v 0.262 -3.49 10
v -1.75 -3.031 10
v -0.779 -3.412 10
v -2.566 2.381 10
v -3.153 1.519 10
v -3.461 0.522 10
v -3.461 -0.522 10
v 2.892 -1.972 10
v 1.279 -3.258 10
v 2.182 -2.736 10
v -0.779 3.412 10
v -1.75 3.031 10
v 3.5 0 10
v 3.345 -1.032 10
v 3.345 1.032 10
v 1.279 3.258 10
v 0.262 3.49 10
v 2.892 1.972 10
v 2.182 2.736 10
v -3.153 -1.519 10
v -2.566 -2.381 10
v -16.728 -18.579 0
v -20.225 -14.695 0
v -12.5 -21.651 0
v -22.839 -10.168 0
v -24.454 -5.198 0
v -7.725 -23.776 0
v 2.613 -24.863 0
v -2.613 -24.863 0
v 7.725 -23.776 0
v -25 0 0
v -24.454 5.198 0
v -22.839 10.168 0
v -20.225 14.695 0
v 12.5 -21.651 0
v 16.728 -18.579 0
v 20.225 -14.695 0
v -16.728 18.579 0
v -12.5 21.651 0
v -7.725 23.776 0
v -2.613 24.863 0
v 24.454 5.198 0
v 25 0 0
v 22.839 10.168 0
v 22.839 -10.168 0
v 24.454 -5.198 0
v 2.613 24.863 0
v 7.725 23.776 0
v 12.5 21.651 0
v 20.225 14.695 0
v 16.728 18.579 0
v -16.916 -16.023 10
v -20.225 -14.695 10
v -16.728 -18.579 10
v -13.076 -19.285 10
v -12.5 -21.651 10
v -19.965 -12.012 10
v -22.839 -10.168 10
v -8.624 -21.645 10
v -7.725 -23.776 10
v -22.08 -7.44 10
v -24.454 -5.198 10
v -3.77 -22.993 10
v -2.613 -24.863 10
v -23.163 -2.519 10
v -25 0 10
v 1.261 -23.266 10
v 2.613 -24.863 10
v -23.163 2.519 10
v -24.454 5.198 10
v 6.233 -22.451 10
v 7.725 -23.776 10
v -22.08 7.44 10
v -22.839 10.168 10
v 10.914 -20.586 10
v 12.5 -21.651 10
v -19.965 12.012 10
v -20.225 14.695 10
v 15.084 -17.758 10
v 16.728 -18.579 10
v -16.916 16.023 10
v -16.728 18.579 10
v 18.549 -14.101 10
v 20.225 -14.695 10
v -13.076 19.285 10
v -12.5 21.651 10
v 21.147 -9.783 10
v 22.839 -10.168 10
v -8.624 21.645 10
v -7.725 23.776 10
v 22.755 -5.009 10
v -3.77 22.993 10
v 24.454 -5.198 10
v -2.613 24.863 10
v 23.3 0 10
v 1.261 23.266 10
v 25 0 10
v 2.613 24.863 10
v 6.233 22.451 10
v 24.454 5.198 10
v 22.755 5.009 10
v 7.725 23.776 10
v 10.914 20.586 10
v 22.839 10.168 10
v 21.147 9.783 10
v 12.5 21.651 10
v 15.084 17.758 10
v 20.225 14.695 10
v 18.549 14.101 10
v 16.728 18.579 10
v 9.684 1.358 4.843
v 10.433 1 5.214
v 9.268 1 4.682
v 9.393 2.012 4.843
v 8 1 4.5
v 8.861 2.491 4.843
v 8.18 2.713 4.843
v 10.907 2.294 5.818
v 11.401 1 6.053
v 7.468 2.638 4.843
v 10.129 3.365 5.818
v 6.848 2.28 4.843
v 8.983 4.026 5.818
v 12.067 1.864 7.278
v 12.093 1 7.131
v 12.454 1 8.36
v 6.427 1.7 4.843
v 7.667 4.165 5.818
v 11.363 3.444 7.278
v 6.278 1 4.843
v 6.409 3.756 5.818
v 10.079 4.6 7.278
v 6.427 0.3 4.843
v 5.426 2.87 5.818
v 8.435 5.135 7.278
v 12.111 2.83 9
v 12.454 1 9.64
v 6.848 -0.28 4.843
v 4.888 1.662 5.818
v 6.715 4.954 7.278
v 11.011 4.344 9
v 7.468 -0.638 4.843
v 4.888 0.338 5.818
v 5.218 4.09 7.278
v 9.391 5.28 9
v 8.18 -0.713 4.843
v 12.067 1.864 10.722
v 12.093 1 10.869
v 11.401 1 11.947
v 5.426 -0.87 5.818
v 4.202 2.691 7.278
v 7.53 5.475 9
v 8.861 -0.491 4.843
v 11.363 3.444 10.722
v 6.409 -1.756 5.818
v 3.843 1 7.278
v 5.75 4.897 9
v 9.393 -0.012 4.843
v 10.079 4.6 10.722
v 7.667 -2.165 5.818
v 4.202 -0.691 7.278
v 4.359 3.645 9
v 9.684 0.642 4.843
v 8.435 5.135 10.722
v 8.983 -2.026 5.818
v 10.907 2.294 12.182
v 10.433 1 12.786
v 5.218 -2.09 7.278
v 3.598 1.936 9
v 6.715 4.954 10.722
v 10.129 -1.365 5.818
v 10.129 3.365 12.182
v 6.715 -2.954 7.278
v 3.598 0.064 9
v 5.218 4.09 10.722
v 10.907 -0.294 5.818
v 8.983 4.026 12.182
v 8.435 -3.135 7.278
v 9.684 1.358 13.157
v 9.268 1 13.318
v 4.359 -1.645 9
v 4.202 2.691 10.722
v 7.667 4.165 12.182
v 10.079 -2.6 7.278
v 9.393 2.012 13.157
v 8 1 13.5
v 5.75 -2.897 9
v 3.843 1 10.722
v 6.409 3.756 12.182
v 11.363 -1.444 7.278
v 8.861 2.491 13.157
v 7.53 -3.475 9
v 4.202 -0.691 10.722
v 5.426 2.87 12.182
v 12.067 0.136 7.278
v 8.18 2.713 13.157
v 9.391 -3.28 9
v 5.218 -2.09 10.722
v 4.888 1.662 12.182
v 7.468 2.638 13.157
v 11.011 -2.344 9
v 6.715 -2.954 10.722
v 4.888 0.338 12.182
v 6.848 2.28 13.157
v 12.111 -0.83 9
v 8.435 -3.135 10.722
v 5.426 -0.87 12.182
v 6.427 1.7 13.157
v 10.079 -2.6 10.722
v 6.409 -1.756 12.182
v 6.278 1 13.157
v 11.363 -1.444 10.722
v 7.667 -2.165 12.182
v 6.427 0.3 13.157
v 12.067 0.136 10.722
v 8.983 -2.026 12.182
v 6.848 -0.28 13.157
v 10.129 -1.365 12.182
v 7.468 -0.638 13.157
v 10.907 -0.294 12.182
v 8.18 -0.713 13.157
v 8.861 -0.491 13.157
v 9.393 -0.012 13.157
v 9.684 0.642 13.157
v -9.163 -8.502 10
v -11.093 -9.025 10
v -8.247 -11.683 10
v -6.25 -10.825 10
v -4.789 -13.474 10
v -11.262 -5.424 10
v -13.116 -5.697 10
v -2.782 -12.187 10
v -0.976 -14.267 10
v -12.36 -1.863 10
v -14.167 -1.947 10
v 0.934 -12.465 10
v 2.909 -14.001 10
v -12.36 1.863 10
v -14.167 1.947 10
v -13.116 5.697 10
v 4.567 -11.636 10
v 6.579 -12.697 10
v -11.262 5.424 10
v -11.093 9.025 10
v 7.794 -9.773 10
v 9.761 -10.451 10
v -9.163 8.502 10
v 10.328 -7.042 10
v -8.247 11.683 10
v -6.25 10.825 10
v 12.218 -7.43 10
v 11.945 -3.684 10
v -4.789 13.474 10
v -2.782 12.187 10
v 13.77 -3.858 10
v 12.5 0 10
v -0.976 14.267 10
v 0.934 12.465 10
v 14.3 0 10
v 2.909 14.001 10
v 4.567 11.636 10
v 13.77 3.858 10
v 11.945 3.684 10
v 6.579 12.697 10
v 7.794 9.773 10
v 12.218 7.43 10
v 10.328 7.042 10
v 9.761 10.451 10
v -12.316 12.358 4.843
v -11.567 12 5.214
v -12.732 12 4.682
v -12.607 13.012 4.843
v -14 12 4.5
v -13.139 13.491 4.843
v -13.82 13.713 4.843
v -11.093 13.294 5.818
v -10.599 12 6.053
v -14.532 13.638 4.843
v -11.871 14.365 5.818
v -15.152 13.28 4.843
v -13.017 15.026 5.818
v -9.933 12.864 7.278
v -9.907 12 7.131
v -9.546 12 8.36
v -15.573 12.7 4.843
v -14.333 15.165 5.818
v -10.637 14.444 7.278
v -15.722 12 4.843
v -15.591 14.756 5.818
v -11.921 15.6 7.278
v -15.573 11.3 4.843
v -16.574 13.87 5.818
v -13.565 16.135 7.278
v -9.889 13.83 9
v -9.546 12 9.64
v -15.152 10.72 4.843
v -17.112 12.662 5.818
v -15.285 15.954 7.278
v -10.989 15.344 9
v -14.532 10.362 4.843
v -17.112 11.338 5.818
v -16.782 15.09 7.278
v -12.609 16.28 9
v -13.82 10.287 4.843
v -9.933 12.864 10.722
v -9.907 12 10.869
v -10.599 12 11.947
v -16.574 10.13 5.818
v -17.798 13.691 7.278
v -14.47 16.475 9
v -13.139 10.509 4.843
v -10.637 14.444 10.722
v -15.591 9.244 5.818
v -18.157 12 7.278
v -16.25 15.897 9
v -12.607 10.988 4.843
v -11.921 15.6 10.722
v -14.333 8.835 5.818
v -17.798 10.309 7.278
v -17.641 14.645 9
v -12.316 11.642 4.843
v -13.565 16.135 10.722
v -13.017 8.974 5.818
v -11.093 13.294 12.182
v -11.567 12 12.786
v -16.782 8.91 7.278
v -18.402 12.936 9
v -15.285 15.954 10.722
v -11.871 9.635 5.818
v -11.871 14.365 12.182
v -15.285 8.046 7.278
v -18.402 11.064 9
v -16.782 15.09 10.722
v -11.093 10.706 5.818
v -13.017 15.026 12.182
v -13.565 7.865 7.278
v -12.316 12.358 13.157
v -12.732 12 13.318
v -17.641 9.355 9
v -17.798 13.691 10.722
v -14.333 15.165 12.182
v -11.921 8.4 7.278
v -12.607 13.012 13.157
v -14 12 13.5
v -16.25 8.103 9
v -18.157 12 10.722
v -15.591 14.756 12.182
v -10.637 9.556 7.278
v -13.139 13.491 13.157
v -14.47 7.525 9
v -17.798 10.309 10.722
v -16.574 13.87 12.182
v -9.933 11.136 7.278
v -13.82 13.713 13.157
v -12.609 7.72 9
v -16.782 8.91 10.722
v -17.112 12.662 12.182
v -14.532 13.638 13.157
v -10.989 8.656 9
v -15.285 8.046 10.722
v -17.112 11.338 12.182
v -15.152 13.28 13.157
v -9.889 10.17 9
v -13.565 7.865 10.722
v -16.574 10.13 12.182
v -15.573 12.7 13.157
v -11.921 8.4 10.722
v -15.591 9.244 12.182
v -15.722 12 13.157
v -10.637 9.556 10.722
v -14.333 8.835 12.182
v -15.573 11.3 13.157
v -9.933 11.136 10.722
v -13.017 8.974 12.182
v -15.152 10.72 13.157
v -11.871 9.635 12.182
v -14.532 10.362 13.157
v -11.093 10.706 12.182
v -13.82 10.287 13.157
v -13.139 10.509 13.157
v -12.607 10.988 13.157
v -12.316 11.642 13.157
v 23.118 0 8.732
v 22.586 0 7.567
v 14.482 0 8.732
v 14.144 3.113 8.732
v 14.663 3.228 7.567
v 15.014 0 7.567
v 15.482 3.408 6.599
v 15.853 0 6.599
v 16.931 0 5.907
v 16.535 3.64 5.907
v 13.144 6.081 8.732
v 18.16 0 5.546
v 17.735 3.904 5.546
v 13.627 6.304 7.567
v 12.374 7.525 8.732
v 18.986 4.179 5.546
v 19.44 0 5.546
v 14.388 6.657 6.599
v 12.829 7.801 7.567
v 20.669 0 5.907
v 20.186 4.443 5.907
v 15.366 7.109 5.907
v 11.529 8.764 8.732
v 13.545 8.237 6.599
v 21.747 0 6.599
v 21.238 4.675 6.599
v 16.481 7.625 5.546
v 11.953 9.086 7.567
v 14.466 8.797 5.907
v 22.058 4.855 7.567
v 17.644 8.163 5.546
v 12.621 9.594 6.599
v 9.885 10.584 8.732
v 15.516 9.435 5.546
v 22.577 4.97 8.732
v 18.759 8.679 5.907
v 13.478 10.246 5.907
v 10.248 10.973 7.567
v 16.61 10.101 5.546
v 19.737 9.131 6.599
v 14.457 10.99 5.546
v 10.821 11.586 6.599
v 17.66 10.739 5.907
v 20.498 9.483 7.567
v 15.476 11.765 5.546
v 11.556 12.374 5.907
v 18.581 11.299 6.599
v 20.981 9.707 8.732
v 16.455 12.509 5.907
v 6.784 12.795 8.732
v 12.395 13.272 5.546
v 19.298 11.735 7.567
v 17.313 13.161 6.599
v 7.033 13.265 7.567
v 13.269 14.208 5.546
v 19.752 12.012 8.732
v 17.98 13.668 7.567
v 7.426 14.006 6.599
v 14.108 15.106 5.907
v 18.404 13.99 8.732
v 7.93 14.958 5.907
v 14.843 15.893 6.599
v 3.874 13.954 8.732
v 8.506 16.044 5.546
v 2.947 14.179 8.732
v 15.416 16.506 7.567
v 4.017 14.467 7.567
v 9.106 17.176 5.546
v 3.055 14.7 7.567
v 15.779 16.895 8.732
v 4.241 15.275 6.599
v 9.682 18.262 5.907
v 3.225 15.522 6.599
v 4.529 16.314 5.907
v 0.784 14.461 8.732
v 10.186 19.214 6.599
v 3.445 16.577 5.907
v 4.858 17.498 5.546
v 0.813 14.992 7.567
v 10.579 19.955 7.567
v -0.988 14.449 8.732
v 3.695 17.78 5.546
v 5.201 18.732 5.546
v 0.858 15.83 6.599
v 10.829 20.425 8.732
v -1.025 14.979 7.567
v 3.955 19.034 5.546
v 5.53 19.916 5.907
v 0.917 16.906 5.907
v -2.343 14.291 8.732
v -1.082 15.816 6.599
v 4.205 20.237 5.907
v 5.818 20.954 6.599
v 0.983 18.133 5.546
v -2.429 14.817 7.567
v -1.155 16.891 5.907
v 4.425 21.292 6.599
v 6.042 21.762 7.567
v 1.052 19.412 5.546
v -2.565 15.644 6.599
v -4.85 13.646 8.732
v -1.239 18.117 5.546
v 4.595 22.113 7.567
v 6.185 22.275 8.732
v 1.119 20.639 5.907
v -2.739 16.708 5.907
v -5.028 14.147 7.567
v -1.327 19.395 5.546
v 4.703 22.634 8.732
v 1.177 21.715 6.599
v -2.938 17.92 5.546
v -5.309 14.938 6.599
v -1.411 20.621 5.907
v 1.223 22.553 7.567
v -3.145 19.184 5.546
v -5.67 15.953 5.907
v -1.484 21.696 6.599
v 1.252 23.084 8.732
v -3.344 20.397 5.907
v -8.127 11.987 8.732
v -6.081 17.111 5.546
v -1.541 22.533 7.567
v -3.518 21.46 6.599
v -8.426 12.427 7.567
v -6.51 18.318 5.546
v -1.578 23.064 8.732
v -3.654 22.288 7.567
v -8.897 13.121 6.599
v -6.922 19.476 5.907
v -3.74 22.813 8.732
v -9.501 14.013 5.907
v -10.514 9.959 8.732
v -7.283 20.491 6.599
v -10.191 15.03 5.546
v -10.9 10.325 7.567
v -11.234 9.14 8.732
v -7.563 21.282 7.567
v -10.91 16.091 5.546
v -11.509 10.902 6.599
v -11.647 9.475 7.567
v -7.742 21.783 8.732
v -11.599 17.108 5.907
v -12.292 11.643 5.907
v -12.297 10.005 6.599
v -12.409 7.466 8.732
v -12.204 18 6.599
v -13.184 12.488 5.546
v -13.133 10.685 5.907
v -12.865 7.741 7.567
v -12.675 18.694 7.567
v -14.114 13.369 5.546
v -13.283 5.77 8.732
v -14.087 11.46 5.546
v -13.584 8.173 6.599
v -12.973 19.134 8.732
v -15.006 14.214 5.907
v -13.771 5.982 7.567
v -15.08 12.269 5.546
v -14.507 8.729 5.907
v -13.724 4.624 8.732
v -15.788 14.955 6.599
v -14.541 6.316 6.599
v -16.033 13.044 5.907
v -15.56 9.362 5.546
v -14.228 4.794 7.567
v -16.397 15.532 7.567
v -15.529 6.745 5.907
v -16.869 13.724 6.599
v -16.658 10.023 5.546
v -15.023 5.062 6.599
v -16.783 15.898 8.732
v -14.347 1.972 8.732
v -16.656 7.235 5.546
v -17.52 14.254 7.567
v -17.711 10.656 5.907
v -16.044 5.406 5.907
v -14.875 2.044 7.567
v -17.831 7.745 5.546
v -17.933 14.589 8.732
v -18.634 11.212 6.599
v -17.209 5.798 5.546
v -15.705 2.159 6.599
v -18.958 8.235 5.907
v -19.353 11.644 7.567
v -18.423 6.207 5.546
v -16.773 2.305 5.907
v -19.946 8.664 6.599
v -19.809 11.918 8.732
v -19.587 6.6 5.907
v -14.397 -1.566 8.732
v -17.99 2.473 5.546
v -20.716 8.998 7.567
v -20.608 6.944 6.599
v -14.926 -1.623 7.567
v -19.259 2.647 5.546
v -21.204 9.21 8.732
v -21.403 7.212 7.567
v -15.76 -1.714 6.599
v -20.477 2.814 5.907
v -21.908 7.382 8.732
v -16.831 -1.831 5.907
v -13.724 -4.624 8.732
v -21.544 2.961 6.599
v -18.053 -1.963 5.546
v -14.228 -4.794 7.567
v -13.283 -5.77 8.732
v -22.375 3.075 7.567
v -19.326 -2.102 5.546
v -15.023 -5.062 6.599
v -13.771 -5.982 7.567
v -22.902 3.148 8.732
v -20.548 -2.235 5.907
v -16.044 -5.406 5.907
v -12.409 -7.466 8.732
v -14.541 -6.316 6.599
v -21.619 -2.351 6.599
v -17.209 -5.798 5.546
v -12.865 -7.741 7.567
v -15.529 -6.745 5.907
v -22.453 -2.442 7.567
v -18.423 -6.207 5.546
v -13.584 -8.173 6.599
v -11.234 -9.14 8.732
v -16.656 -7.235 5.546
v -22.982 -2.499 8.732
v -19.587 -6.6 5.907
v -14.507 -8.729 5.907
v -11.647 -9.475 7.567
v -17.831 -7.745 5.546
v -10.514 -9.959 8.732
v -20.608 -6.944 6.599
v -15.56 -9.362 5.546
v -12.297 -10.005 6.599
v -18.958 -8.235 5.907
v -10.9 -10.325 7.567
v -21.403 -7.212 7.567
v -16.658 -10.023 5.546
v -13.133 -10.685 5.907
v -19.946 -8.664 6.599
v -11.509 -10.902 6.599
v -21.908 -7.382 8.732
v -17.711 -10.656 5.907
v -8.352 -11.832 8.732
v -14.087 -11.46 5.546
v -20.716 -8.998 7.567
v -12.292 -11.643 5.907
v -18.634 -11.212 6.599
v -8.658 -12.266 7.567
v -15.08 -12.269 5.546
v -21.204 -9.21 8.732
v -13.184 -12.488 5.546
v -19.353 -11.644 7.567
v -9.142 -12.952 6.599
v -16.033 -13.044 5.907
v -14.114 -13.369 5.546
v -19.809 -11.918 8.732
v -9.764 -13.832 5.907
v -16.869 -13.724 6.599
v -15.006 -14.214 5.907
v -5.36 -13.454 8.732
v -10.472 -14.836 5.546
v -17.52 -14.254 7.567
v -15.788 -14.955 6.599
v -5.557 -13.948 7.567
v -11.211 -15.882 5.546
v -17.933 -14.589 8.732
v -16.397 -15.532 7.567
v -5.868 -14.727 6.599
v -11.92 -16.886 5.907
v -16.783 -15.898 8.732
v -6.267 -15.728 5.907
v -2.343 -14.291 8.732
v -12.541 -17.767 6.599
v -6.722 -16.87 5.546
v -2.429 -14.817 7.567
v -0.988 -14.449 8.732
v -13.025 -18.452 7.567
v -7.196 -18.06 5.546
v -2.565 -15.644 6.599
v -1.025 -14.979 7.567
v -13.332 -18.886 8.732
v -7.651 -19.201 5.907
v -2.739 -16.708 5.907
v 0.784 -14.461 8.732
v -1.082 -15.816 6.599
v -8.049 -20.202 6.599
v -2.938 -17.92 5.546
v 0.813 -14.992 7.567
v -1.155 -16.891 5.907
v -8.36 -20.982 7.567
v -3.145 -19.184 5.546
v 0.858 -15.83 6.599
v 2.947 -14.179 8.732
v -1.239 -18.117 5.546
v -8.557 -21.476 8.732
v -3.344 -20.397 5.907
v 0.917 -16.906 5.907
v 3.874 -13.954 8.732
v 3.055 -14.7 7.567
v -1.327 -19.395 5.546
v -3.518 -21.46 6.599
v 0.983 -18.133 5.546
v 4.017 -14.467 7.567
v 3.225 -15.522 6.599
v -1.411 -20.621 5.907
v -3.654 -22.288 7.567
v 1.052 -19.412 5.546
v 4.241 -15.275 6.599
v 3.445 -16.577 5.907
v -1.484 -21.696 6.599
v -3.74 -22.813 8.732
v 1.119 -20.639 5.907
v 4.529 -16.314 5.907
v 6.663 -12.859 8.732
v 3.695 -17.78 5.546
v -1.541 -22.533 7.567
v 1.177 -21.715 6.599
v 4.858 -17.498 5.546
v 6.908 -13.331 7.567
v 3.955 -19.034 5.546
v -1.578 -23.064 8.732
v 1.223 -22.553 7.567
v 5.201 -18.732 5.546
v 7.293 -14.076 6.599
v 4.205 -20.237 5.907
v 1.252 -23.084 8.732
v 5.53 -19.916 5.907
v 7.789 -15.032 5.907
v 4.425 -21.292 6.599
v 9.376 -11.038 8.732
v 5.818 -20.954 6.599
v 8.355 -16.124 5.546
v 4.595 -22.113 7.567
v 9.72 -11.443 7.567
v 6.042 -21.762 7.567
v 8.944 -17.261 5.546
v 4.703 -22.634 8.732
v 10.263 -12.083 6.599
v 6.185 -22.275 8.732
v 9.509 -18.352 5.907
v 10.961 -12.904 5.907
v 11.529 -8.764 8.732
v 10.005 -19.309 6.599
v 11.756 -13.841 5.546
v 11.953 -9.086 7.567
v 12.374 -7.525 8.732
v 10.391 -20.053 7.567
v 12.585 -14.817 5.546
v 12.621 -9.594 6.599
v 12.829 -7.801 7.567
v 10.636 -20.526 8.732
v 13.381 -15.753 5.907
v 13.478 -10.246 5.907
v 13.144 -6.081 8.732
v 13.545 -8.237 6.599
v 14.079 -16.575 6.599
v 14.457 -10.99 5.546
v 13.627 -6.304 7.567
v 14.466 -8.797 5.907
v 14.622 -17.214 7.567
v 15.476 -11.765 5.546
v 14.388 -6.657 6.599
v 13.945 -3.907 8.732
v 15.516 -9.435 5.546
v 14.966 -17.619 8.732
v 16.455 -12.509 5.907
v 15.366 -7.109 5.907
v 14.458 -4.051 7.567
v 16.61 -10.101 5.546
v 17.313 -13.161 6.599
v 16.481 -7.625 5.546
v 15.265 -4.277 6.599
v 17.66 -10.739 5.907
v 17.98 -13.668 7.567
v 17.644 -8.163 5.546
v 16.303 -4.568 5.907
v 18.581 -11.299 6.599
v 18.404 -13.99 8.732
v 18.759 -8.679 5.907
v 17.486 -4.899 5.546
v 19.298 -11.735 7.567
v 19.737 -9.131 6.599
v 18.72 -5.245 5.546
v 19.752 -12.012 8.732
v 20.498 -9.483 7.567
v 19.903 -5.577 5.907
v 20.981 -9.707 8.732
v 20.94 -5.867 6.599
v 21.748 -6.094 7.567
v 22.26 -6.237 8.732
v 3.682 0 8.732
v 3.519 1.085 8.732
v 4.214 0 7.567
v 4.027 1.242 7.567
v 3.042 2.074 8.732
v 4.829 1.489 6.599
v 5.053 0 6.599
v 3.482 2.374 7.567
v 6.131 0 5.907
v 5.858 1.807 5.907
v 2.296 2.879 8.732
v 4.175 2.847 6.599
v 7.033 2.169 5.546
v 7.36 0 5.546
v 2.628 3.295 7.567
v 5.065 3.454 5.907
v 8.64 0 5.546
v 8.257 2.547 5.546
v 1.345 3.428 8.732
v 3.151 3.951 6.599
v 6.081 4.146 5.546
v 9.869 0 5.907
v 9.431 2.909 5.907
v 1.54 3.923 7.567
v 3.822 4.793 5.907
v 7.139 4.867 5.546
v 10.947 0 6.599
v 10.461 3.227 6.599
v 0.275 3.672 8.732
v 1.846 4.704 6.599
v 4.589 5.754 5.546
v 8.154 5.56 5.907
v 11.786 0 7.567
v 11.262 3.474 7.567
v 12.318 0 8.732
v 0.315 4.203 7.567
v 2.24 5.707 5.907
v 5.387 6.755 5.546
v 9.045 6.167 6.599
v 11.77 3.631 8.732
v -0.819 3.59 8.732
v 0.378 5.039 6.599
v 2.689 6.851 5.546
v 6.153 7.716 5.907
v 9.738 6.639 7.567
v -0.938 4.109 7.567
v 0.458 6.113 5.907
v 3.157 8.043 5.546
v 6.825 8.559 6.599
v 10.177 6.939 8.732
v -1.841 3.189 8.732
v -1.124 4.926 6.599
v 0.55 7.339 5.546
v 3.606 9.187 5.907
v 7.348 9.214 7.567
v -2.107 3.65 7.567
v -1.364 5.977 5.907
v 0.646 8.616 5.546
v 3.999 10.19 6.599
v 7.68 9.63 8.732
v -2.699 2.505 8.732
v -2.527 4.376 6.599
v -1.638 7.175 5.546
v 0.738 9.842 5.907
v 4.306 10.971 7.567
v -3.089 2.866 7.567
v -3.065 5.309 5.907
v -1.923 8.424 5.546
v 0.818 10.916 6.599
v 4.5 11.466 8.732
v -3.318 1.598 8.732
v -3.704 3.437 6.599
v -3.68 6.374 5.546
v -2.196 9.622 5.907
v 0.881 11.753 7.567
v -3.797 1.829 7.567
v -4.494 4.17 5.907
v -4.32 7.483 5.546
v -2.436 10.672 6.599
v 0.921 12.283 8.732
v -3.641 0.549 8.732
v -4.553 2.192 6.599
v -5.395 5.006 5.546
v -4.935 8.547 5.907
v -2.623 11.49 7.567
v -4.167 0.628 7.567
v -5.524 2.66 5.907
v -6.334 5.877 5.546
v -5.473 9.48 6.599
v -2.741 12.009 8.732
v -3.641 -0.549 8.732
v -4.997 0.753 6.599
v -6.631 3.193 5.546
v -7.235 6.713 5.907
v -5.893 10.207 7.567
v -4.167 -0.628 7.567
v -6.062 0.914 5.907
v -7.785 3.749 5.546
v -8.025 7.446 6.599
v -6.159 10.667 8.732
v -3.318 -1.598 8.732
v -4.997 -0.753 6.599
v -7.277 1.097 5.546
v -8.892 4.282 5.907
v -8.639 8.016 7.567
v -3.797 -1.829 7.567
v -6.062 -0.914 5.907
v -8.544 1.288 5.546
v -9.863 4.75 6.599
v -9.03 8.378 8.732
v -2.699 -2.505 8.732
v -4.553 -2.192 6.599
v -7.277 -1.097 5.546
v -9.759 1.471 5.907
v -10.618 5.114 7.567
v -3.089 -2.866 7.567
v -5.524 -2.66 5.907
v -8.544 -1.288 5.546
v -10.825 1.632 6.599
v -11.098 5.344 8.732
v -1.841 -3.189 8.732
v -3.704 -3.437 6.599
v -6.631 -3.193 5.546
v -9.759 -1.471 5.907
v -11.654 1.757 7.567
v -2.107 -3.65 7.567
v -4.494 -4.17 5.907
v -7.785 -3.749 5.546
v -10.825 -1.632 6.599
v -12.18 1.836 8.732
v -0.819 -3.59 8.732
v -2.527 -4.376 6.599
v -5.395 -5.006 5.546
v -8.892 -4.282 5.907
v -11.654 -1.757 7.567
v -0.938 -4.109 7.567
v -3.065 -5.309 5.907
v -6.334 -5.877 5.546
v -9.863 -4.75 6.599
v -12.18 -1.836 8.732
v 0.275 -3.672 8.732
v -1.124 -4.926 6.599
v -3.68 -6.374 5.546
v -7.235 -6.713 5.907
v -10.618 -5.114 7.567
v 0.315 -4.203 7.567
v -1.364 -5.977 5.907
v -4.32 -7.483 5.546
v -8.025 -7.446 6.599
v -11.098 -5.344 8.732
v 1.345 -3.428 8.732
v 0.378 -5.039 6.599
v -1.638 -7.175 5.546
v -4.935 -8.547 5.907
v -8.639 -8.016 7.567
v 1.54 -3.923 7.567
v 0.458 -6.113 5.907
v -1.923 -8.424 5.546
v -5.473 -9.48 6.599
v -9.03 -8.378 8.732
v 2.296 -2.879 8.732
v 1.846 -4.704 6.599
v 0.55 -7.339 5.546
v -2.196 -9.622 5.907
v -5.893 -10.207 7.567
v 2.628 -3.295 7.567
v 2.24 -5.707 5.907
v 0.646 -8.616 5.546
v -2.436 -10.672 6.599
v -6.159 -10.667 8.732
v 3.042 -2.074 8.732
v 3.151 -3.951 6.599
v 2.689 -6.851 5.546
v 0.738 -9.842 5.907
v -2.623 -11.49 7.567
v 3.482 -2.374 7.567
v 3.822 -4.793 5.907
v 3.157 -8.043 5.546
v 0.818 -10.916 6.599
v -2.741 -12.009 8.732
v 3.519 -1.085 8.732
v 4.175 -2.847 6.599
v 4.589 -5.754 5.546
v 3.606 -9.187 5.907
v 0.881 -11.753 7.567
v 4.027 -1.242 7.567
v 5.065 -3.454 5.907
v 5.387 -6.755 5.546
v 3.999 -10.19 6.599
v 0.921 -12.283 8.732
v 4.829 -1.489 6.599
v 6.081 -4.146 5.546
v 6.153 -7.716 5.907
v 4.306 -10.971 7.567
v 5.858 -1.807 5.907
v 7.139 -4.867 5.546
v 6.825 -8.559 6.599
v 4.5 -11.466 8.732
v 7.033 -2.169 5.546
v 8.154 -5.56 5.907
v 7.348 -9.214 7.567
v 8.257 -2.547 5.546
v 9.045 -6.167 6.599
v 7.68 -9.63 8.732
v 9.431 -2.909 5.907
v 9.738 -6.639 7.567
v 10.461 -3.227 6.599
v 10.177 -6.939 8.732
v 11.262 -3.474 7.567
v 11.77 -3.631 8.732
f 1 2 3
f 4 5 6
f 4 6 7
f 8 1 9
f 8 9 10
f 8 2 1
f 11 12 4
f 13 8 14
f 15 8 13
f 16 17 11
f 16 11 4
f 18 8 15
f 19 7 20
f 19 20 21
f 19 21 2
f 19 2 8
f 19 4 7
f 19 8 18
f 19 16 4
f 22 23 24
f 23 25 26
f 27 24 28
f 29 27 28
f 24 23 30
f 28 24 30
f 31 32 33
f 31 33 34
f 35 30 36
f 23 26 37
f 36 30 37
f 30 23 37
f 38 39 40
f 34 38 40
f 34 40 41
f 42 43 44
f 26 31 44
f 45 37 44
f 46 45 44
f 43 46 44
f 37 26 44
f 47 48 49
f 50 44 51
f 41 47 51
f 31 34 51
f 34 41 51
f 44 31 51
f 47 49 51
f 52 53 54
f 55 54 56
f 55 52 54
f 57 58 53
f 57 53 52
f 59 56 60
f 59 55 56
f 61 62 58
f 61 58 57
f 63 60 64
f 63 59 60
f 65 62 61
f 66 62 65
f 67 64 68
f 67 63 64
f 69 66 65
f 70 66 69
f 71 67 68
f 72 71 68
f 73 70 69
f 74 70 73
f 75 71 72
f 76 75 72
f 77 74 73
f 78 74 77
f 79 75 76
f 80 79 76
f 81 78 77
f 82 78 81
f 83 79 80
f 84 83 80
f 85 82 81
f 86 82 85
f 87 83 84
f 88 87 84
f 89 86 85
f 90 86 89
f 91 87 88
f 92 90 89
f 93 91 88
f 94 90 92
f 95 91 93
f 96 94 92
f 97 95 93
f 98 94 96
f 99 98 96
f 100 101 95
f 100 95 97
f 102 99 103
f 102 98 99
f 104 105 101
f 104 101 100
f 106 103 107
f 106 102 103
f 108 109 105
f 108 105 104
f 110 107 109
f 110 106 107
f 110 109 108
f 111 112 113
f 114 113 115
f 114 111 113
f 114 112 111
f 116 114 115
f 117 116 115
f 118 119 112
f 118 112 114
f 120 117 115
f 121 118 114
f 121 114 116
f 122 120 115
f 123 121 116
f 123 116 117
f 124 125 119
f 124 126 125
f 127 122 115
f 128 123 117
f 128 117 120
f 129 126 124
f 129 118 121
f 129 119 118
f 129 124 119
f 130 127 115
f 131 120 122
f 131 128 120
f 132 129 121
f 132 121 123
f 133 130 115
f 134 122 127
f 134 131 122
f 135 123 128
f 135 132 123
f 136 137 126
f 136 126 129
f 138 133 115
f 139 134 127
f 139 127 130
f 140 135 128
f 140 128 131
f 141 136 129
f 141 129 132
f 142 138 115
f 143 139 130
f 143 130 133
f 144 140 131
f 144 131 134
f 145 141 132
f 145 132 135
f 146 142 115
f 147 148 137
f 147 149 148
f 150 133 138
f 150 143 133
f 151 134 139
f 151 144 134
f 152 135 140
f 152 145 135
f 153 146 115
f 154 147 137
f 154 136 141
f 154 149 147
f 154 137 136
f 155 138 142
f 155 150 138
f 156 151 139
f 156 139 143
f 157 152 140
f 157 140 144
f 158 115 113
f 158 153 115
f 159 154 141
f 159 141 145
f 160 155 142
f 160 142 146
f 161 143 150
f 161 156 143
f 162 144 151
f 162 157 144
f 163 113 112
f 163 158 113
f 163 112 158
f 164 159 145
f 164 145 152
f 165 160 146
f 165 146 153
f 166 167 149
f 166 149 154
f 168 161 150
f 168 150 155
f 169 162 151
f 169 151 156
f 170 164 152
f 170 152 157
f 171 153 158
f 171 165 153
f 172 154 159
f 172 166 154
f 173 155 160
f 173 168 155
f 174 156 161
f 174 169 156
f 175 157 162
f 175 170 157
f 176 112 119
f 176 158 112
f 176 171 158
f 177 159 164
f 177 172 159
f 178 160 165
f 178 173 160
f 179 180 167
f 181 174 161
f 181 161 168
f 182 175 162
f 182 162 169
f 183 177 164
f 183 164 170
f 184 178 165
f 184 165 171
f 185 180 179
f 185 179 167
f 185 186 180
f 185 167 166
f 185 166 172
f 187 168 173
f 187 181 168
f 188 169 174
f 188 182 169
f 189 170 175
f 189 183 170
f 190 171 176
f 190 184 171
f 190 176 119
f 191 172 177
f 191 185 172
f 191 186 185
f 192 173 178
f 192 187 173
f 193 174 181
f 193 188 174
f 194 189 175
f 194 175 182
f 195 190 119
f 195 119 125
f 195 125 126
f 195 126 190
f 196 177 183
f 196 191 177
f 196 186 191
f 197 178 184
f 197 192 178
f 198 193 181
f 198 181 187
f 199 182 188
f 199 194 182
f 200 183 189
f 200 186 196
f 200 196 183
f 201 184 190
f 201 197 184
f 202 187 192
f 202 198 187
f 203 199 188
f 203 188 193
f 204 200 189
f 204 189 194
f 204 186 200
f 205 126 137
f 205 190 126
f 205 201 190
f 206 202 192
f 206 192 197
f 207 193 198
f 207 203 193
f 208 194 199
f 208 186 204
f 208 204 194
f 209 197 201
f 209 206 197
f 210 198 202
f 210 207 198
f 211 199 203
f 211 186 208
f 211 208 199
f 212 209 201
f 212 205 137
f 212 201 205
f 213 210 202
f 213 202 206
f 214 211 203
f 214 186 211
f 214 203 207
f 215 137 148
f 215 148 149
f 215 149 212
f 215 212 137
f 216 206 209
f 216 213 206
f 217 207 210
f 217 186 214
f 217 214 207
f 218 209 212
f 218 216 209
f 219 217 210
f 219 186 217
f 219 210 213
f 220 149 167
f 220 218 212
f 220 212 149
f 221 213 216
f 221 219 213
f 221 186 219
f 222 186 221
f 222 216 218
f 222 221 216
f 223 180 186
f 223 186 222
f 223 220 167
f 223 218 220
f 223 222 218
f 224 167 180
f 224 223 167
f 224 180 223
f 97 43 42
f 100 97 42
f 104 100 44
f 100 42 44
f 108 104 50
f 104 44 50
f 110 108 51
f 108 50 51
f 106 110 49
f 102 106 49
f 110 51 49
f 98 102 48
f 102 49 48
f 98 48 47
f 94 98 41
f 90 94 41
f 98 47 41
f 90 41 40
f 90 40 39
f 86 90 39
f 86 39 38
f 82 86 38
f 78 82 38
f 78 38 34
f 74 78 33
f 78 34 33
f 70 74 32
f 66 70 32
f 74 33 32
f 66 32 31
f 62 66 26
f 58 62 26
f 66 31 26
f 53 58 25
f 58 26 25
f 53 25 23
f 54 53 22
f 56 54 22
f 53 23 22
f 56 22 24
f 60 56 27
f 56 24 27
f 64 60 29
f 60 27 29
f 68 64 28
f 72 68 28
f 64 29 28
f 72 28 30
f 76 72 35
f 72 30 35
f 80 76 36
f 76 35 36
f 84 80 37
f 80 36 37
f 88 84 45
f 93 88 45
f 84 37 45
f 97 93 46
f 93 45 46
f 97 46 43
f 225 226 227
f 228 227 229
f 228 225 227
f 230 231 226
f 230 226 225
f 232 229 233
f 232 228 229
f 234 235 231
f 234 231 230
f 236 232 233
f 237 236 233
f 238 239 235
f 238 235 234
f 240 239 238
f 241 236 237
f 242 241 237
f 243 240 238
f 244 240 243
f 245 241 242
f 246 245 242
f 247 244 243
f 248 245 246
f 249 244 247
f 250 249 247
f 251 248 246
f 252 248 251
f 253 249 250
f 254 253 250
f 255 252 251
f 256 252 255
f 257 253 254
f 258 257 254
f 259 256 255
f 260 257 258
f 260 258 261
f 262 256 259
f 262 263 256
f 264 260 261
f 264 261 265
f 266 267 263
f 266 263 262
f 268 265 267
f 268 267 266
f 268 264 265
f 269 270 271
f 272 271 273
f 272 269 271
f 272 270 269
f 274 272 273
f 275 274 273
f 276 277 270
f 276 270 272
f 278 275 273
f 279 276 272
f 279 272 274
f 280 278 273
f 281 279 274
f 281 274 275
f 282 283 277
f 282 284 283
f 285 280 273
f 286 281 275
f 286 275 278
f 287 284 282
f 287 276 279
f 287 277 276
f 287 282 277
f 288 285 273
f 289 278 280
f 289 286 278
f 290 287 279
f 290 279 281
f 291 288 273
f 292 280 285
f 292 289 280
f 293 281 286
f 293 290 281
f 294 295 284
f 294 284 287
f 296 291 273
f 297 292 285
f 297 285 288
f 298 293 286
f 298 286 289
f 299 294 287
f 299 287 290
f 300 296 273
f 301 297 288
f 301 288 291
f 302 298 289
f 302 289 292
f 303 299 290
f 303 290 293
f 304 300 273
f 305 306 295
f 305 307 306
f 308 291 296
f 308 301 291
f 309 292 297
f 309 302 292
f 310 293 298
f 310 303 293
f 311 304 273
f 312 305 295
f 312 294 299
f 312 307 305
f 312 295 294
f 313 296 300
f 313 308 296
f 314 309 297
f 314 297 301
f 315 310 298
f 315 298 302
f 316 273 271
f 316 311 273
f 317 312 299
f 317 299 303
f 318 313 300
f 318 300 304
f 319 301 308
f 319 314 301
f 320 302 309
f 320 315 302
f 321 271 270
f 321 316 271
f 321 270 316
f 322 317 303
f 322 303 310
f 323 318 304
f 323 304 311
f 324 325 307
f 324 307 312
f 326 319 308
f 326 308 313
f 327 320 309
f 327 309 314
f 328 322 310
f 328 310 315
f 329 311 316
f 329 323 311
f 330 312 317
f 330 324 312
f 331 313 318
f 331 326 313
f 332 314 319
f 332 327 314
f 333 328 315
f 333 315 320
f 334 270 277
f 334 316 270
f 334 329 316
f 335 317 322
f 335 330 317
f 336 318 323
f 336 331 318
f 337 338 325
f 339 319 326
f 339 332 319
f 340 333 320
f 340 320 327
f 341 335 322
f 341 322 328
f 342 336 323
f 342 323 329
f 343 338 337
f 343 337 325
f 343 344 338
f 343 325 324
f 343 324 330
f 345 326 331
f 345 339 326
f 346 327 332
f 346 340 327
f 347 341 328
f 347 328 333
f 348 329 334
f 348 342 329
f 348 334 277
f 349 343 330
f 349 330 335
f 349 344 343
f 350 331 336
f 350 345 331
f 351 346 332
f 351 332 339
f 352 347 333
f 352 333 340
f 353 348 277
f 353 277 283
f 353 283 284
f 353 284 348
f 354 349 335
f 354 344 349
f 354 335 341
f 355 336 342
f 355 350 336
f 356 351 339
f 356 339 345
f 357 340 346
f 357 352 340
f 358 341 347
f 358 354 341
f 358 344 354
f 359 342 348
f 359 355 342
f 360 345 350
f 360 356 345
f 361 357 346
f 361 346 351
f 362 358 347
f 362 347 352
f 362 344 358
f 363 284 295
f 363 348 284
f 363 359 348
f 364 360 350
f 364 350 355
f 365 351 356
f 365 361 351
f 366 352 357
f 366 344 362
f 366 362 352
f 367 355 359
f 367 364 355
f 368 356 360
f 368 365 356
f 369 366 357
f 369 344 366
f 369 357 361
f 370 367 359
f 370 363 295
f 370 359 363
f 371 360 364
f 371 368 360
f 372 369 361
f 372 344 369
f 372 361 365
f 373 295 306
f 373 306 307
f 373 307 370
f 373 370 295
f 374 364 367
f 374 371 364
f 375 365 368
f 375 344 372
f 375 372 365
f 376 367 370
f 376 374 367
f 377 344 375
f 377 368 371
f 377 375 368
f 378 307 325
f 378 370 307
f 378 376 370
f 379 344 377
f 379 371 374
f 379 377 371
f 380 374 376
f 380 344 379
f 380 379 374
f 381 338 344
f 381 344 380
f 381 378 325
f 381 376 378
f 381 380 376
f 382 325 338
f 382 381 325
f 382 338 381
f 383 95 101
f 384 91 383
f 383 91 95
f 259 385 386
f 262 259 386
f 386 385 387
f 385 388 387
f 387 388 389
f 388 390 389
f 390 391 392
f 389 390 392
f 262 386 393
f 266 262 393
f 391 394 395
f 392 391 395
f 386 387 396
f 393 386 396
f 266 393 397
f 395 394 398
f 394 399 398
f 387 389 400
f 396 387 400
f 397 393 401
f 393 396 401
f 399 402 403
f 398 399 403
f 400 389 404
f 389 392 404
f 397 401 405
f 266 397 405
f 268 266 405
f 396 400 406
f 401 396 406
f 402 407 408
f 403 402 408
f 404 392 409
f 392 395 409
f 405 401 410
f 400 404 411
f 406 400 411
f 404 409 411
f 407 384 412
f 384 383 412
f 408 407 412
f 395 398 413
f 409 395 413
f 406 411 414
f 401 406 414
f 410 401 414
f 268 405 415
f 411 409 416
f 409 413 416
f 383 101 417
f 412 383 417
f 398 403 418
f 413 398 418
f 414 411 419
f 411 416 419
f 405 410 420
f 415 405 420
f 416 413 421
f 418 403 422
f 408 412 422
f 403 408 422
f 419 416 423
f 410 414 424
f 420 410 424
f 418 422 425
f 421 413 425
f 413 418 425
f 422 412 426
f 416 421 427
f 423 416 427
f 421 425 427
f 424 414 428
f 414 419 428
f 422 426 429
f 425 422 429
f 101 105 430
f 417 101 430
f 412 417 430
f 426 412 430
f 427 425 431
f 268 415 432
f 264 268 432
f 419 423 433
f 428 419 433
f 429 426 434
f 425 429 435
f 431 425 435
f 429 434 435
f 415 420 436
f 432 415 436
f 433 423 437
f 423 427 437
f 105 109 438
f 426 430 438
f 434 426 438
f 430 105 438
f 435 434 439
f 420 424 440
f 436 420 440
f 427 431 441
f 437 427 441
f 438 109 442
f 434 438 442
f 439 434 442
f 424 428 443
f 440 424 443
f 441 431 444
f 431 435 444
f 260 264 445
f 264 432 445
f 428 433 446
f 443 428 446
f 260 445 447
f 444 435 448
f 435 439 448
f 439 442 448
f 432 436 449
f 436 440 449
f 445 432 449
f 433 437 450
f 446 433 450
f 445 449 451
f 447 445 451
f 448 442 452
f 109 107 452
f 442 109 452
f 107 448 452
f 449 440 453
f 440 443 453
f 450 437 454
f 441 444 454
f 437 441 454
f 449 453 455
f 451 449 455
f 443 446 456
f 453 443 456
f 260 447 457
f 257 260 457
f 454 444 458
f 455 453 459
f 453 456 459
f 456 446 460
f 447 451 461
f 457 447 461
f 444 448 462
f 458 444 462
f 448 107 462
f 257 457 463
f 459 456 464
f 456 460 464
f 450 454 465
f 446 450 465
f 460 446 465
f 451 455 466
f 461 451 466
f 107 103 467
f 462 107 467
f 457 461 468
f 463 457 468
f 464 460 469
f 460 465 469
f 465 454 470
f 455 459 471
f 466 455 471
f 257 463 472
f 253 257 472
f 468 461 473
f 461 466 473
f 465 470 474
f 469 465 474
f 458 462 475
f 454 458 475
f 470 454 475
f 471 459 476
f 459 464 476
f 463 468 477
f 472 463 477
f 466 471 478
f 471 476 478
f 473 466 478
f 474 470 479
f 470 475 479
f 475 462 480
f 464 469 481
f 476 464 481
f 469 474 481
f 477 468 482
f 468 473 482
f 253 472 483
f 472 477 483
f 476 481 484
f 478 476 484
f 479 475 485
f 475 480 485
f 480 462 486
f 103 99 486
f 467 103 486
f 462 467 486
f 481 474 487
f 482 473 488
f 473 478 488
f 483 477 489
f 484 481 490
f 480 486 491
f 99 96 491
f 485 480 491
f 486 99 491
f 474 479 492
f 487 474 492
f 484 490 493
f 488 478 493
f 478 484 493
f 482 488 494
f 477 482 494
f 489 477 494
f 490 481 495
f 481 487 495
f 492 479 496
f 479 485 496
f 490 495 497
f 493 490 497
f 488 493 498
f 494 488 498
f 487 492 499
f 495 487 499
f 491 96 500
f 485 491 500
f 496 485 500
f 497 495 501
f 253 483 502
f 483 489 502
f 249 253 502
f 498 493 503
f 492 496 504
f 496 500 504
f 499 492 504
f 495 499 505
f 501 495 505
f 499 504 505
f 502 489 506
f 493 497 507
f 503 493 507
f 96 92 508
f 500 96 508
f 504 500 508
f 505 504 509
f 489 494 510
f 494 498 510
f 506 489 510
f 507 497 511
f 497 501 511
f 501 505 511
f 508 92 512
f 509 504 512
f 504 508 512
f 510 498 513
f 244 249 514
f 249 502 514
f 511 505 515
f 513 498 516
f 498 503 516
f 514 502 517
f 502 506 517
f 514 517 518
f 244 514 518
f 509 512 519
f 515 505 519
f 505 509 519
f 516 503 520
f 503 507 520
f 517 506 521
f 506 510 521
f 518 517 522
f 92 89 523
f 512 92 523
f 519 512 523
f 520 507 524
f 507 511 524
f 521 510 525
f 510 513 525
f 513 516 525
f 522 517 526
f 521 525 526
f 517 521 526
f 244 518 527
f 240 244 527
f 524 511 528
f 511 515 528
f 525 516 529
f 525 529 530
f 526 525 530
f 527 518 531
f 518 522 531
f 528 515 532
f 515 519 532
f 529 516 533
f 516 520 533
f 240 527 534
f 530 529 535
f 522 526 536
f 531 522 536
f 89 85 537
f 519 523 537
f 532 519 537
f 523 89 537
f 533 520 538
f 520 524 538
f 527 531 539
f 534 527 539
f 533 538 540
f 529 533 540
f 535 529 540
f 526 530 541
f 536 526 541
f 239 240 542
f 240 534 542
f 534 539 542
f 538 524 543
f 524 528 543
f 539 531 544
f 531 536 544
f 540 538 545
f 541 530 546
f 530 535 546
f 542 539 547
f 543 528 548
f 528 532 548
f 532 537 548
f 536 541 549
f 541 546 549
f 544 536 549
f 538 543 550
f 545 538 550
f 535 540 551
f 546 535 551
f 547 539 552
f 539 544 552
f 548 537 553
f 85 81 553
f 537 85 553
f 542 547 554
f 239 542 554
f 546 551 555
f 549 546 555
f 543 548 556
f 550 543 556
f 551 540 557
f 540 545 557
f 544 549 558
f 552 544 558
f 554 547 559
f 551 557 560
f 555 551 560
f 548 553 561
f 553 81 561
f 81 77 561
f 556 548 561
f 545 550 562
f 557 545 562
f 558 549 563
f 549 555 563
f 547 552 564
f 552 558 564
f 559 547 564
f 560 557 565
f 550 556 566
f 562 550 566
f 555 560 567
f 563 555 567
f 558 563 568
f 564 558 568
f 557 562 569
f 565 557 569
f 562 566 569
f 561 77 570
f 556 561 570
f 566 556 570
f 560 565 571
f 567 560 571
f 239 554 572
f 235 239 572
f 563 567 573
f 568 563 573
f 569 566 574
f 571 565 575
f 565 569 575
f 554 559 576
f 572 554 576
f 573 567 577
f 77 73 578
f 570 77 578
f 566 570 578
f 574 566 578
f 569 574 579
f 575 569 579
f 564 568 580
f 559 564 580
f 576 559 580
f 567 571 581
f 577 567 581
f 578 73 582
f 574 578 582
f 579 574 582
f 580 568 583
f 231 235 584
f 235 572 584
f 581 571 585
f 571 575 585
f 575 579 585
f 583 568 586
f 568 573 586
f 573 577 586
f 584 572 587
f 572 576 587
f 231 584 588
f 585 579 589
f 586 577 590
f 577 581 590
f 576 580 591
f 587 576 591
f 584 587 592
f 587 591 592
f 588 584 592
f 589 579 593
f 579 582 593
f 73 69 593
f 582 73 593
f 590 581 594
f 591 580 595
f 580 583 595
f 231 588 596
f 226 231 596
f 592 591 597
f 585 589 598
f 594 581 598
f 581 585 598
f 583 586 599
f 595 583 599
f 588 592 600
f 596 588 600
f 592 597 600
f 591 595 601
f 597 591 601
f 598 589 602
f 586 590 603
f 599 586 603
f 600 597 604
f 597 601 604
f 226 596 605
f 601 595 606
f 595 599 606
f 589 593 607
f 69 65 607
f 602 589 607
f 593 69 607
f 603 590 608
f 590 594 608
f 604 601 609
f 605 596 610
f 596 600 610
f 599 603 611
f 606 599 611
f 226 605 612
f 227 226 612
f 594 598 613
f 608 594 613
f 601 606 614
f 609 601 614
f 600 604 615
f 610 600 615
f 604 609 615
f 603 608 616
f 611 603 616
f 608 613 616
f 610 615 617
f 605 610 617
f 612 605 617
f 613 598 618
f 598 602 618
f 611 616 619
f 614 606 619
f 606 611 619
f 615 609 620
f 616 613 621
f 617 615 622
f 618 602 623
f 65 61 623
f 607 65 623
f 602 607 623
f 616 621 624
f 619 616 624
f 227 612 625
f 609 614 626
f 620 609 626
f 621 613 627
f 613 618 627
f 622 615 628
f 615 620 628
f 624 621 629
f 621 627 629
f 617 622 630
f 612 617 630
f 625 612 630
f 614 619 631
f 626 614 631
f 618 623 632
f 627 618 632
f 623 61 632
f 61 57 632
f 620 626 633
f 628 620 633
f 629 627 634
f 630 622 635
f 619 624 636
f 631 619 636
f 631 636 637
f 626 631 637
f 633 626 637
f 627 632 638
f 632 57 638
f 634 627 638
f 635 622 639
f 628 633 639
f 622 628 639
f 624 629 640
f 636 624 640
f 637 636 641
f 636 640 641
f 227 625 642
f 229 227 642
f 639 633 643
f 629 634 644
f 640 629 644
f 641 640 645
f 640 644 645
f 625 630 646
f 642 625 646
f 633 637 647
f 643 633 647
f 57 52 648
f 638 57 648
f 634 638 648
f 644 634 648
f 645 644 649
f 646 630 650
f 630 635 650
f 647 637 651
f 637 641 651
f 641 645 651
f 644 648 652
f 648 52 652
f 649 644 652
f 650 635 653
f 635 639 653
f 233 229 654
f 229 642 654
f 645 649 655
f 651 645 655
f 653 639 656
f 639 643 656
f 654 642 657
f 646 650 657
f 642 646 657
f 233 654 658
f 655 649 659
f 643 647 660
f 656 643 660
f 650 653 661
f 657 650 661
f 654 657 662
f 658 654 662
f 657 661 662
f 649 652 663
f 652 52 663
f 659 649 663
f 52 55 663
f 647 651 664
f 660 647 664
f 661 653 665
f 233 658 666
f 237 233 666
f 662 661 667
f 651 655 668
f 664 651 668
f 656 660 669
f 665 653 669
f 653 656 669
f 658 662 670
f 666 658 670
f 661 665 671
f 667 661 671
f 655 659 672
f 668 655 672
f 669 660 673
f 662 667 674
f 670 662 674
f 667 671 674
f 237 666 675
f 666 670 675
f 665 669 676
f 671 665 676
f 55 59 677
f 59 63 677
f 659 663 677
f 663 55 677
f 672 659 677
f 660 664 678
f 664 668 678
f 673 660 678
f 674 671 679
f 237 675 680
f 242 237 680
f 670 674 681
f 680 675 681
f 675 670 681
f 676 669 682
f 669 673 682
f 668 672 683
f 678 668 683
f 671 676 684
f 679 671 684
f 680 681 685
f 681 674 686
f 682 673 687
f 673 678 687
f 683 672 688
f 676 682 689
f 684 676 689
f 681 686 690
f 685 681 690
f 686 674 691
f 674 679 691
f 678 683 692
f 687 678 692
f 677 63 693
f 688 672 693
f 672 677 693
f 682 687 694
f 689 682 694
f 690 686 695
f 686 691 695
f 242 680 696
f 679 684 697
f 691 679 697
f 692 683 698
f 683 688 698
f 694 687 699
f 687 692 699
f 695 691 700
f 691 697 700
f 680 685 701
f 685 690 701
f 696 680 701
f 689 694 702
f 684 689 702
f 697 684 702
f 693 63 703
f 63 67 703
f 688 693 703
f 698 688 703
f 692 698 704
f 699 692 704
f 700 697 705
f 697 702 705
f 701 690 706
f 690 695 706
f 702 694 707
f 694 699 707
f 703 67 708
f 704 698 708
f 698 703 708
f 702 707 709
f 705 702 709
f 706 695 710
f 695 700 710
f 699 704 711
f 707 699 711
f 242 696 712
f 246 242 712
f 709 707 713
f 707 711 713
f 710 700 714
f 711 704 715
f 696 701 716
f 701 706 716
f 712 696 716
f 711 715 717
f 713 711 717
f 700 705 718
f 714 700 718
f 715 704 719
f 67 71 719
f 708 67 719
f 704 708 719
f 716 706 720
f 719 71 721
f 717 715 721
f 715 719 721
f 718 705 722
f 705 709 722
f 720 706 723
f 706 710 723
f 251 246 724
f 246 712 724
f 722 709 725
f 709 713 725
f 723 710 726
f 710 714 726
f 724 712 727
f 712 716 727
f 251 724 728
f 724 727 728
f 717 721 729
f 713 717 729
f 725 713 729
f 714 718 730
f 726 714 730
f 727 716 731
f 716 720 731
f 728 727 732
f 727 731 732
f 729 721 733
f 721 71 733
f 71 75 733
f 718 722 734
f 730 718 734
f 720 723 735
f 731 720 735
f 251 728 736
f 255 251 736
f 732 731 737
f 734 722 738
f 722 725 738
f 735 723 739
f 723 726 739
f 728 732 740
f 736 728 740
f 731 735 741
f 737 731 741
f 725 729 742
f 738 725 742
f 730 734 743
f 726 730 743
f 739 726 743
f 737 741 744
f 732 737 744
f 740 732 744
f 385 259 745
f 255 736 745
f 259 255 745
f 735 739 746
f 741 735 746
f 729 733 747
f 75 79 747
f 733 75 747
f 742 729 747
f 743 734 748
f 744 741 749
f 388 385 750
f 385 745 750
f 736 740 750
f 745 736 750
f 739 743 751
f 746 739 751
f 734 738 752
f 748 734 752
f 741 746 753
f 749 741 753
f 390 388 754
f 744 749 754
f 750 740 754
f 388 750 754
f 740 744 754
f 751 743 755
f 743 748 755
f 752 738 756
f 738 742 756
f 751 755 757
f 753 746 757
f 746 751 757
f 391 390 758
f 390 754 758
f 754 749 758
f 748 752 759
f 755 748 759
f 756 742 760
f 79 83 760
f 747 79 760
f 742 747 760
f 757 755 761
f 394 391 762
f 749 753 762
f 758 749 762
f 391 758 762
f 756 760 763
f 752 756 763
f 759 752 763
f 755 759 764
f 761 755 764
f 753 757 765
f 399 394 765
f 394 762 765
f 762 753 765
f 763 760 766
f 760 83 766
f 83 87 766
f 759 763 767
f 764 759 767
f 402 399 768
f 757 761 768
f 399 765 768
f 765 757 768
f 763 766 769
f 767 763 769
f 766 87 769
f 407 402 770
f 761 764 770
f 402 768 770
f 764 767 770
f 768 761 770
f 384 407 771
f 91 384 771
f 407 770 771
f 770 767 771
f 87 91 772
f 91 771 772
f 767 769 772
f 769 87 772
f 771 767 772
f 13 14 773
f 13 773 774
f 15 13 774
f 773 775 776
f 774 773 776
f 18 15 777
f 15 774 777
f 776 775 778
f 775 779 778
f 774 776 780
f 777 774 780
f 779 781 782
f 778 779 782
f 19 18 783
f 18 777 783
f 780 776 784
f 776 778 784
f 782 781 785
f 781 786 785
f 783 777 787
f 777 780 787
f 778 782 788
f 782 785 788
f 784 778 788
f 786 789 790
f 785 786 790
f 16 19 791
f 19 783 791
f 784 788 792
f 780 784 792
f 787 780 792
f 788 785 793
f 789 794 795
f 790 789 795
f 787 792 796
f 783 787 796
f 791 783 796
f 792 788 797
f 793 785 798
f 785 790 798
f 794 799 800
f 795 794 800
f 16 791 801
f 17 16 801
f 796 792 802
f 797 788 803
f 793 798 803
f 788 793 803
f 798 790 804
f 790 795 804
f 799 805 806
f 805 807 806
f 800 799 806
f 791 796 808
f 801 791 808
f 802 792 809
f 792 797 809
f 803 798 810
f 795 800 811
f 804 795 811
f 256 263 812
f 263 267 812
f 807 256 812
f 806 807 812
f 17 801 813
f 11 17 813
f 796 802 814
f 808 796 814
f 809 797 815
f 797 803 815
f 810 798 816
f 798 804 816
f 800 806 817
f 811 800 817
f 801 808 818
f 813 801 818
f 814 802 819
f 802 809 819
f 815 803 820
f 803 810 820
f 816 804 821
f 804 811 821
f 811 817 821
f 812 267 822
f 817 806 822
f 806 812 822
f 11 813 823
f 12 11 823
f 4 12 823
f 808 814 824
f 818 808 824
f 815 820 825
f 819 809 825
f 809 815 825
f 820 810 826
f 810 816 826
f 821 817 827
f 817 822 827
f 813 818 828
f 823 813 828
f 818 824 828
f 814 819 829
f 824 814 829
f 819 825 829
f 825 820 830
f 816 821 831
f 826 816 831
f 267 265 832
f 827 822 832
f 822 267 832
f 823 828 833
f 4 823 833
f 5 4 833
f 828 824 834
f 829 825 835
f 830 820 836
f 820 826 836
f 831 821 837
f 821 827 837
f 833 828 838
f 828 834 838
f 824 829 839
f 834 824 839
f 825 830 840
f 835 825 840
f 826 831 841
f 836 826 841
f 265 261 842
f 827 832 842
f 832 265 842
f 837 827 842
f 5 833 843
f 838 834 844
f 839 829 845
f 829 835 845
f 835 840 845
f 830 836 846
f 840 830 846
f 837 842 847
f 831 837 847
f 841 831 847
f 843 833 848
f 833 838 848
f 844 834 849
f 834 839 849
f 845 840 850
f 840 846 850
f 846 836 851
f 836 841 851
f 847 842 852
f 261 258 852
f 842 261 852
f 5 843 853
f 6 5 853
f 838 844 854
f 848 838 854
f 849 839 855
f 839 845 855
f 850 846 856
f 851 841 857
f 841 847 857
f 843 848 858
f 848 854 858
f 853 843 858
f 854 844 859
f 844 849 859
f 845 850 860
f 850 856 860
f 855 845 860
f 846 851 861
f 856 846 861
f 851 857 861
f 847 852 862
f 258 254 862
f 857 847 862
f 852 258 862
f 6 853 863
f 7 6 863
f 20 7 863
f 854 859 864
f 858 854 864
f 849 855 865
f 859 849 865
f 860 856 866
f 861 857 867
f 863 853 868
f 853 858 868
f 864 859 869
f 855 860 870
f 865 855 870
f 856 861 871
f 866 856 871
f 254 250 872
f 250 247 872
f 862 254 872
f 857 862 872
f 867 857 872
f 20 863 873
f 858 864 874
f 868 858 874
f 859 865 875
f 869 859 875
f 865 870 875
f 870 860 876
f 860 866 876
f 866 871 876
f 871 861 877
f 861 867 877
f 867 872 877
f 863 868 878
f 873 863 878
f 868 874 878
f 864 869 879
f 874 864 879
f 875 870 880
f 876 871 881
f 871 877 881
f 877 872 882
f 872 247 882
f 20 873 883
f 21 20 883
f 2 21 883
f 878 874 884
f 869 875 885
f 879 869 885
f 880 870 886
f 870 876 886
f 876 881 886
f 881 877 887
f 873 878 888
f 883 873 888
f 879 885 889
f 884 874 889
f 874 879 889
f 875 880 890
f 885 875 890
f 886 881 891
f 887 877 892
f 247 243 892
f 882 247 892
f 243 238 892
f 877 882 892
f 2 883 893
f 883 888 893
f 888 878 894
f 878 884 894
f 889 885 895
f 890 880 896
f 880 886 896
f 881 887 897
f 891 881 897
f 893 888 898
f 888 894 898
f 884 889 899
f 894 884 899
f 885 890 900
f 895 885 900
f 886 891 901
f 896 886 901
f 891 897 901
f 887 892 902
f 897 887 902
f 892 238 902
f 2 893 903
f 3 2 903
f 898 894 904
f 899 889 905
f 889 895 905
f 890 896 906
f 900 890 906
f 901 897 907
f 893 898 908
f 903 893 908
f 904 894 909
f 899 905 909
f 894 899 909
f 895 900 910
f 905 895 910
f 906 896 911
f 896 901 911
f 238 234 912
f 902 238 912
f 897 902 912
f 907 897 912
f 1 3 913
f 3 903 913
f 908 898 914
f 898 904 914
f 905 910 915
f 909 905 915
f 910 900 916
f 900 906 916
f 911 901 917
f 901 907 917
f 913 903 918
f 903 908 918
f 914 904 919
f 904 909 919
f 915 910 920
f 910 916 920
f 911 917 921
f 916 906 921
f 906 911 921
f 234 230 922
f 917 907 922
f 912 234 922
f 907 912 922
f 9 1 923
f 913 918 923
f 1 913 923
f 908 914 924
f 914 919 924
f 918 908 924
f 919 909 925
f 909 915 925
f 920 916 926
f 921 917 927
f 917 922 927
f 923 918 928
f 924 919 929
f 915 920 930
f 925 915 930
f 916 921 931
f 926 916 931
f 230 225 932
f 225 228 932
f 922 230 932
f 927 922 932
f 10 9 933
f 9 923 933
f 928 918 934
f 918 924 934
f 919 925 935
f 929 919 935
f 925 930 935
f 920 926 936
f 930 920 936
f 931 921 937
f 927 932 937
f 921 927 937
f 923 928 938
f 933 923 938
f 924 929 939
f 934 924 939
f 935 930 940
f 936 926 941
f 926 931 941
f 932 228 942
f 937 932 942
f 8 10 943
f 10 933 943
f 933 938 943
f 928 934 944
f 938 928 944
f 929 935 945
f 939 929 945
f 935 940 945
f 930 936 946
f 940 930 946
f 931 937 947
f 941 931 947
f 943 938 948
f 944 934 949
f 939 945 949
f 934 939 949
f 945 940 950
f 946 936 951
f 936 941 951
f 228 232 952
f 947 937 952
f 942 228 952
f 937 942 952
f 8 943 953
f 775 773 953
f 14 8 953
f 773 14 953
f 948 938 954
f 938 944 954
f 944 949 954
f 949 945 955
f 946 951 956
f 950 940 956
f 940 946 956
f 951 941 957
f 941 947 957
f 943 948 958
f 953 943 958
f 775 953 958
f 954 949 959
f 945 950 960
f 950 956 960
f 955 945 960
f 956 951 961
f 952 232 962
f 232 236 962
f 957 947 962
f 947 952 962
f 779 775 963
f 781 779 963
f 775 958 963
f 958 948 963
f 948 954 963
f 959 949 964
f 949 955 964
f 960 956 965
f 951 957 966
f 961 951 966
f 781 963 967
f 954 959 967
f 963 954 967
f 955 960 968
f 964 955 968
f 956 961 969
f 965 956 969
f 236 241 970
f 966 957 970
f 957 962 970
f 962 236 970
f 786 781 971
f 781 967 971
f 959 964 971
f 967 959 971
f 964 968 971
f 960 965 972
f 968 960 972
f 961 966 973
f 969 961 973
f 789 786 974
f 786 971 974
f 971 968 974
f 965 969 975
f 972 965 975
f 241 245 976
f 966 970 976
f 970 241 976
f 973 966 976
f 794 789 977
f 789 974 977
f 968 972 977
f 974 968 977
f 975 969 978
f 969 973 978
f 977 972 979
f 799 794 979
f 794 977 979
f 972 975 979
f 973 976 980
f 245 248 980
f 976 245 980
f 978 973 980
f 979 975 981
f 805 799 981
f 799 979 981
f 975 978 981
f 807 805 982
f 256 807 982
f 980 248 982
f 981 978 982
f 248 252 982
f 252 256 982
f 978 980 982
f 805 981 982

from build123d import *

# Parameters (mm, degrees)
TORUS001_R     = 4.5
TORUS_R        = 4.5
CYLINDER_R     = 25
CYLINDER_DEPTH = 10


with BuildPart() as torus001:
    # Torus001 → Torus001 (revolve)
    with BuildSketch(Plane(origin=(0, 0, 10), x_dir=(1, 0, 0), z_dir=(0, -1, 0))):
        with Locations((18.8, 0)):
            Circle(TORUS001_R)
    revolve(axis=Axis((0, 0, 10), (0, 0, 1)))


with BuildPart() as torus:
    # Torus → Torus (revolve)
    with BuildSketch(Plane(origin=(0, 0, 10), x_dir=(1, 0, 0), z_dir=(0, -1, 0))):
        with Locations((8, 0)):
            Circle(TORUS_R)
    revolve(axis=Axis((0, 0, 10), (0, 0, 1)))


with BuildPart() as guarda_caniques:
    # Cylinder → Cylinder (new body)
    with BuildSketch(Plane.XY):
        Circle(CYLINDER_R)
    extrude(amount=CYLINDER_DEPTH)

    # Cut: cut Torus
    add(torus.part, mode=Mode.SUBTRACT)

    # Cut001: cut Torus001
    add(torus001.part, mode=Mode.SUBTRACT)


with BuildPart() as sphere:
    # Sphere → Sphere (revolve)
    with BuildSketch(Plane(origin=(8, 1, 9), x_dir=(1, 0, 0), z_dir=(0, -1, 0))):
        with BuildLine():
            ThreePointArc((0, -4.5), (4.5, 0), (0, 4.5))
            Line((0, 4.5), (0, -4.5))
        make_face()
    revolve(axis=Axis((8, 1, 9), (0, 0, 1)))


with BuildPart() as sphere001:
    # Sphere001 → Sphere001 (revolve)
    with BuildSketch(Plane(origin=(-14, 12, 9), x_dir=(1, 0, 0), z_dir=(0, -1, 0))):
        with BuildLine():
            ThreePointArc((0, -4.5), (4.5, 0), (0, 4.5))
            Line((0, 4.5), (0, -4.5))
        make_face()
    revolve(axis=Axis((-14, 12, 9), (0, 0, 1)))


solid = Compound([guarda_caniques.part, sphere.part, sphere001.part])
